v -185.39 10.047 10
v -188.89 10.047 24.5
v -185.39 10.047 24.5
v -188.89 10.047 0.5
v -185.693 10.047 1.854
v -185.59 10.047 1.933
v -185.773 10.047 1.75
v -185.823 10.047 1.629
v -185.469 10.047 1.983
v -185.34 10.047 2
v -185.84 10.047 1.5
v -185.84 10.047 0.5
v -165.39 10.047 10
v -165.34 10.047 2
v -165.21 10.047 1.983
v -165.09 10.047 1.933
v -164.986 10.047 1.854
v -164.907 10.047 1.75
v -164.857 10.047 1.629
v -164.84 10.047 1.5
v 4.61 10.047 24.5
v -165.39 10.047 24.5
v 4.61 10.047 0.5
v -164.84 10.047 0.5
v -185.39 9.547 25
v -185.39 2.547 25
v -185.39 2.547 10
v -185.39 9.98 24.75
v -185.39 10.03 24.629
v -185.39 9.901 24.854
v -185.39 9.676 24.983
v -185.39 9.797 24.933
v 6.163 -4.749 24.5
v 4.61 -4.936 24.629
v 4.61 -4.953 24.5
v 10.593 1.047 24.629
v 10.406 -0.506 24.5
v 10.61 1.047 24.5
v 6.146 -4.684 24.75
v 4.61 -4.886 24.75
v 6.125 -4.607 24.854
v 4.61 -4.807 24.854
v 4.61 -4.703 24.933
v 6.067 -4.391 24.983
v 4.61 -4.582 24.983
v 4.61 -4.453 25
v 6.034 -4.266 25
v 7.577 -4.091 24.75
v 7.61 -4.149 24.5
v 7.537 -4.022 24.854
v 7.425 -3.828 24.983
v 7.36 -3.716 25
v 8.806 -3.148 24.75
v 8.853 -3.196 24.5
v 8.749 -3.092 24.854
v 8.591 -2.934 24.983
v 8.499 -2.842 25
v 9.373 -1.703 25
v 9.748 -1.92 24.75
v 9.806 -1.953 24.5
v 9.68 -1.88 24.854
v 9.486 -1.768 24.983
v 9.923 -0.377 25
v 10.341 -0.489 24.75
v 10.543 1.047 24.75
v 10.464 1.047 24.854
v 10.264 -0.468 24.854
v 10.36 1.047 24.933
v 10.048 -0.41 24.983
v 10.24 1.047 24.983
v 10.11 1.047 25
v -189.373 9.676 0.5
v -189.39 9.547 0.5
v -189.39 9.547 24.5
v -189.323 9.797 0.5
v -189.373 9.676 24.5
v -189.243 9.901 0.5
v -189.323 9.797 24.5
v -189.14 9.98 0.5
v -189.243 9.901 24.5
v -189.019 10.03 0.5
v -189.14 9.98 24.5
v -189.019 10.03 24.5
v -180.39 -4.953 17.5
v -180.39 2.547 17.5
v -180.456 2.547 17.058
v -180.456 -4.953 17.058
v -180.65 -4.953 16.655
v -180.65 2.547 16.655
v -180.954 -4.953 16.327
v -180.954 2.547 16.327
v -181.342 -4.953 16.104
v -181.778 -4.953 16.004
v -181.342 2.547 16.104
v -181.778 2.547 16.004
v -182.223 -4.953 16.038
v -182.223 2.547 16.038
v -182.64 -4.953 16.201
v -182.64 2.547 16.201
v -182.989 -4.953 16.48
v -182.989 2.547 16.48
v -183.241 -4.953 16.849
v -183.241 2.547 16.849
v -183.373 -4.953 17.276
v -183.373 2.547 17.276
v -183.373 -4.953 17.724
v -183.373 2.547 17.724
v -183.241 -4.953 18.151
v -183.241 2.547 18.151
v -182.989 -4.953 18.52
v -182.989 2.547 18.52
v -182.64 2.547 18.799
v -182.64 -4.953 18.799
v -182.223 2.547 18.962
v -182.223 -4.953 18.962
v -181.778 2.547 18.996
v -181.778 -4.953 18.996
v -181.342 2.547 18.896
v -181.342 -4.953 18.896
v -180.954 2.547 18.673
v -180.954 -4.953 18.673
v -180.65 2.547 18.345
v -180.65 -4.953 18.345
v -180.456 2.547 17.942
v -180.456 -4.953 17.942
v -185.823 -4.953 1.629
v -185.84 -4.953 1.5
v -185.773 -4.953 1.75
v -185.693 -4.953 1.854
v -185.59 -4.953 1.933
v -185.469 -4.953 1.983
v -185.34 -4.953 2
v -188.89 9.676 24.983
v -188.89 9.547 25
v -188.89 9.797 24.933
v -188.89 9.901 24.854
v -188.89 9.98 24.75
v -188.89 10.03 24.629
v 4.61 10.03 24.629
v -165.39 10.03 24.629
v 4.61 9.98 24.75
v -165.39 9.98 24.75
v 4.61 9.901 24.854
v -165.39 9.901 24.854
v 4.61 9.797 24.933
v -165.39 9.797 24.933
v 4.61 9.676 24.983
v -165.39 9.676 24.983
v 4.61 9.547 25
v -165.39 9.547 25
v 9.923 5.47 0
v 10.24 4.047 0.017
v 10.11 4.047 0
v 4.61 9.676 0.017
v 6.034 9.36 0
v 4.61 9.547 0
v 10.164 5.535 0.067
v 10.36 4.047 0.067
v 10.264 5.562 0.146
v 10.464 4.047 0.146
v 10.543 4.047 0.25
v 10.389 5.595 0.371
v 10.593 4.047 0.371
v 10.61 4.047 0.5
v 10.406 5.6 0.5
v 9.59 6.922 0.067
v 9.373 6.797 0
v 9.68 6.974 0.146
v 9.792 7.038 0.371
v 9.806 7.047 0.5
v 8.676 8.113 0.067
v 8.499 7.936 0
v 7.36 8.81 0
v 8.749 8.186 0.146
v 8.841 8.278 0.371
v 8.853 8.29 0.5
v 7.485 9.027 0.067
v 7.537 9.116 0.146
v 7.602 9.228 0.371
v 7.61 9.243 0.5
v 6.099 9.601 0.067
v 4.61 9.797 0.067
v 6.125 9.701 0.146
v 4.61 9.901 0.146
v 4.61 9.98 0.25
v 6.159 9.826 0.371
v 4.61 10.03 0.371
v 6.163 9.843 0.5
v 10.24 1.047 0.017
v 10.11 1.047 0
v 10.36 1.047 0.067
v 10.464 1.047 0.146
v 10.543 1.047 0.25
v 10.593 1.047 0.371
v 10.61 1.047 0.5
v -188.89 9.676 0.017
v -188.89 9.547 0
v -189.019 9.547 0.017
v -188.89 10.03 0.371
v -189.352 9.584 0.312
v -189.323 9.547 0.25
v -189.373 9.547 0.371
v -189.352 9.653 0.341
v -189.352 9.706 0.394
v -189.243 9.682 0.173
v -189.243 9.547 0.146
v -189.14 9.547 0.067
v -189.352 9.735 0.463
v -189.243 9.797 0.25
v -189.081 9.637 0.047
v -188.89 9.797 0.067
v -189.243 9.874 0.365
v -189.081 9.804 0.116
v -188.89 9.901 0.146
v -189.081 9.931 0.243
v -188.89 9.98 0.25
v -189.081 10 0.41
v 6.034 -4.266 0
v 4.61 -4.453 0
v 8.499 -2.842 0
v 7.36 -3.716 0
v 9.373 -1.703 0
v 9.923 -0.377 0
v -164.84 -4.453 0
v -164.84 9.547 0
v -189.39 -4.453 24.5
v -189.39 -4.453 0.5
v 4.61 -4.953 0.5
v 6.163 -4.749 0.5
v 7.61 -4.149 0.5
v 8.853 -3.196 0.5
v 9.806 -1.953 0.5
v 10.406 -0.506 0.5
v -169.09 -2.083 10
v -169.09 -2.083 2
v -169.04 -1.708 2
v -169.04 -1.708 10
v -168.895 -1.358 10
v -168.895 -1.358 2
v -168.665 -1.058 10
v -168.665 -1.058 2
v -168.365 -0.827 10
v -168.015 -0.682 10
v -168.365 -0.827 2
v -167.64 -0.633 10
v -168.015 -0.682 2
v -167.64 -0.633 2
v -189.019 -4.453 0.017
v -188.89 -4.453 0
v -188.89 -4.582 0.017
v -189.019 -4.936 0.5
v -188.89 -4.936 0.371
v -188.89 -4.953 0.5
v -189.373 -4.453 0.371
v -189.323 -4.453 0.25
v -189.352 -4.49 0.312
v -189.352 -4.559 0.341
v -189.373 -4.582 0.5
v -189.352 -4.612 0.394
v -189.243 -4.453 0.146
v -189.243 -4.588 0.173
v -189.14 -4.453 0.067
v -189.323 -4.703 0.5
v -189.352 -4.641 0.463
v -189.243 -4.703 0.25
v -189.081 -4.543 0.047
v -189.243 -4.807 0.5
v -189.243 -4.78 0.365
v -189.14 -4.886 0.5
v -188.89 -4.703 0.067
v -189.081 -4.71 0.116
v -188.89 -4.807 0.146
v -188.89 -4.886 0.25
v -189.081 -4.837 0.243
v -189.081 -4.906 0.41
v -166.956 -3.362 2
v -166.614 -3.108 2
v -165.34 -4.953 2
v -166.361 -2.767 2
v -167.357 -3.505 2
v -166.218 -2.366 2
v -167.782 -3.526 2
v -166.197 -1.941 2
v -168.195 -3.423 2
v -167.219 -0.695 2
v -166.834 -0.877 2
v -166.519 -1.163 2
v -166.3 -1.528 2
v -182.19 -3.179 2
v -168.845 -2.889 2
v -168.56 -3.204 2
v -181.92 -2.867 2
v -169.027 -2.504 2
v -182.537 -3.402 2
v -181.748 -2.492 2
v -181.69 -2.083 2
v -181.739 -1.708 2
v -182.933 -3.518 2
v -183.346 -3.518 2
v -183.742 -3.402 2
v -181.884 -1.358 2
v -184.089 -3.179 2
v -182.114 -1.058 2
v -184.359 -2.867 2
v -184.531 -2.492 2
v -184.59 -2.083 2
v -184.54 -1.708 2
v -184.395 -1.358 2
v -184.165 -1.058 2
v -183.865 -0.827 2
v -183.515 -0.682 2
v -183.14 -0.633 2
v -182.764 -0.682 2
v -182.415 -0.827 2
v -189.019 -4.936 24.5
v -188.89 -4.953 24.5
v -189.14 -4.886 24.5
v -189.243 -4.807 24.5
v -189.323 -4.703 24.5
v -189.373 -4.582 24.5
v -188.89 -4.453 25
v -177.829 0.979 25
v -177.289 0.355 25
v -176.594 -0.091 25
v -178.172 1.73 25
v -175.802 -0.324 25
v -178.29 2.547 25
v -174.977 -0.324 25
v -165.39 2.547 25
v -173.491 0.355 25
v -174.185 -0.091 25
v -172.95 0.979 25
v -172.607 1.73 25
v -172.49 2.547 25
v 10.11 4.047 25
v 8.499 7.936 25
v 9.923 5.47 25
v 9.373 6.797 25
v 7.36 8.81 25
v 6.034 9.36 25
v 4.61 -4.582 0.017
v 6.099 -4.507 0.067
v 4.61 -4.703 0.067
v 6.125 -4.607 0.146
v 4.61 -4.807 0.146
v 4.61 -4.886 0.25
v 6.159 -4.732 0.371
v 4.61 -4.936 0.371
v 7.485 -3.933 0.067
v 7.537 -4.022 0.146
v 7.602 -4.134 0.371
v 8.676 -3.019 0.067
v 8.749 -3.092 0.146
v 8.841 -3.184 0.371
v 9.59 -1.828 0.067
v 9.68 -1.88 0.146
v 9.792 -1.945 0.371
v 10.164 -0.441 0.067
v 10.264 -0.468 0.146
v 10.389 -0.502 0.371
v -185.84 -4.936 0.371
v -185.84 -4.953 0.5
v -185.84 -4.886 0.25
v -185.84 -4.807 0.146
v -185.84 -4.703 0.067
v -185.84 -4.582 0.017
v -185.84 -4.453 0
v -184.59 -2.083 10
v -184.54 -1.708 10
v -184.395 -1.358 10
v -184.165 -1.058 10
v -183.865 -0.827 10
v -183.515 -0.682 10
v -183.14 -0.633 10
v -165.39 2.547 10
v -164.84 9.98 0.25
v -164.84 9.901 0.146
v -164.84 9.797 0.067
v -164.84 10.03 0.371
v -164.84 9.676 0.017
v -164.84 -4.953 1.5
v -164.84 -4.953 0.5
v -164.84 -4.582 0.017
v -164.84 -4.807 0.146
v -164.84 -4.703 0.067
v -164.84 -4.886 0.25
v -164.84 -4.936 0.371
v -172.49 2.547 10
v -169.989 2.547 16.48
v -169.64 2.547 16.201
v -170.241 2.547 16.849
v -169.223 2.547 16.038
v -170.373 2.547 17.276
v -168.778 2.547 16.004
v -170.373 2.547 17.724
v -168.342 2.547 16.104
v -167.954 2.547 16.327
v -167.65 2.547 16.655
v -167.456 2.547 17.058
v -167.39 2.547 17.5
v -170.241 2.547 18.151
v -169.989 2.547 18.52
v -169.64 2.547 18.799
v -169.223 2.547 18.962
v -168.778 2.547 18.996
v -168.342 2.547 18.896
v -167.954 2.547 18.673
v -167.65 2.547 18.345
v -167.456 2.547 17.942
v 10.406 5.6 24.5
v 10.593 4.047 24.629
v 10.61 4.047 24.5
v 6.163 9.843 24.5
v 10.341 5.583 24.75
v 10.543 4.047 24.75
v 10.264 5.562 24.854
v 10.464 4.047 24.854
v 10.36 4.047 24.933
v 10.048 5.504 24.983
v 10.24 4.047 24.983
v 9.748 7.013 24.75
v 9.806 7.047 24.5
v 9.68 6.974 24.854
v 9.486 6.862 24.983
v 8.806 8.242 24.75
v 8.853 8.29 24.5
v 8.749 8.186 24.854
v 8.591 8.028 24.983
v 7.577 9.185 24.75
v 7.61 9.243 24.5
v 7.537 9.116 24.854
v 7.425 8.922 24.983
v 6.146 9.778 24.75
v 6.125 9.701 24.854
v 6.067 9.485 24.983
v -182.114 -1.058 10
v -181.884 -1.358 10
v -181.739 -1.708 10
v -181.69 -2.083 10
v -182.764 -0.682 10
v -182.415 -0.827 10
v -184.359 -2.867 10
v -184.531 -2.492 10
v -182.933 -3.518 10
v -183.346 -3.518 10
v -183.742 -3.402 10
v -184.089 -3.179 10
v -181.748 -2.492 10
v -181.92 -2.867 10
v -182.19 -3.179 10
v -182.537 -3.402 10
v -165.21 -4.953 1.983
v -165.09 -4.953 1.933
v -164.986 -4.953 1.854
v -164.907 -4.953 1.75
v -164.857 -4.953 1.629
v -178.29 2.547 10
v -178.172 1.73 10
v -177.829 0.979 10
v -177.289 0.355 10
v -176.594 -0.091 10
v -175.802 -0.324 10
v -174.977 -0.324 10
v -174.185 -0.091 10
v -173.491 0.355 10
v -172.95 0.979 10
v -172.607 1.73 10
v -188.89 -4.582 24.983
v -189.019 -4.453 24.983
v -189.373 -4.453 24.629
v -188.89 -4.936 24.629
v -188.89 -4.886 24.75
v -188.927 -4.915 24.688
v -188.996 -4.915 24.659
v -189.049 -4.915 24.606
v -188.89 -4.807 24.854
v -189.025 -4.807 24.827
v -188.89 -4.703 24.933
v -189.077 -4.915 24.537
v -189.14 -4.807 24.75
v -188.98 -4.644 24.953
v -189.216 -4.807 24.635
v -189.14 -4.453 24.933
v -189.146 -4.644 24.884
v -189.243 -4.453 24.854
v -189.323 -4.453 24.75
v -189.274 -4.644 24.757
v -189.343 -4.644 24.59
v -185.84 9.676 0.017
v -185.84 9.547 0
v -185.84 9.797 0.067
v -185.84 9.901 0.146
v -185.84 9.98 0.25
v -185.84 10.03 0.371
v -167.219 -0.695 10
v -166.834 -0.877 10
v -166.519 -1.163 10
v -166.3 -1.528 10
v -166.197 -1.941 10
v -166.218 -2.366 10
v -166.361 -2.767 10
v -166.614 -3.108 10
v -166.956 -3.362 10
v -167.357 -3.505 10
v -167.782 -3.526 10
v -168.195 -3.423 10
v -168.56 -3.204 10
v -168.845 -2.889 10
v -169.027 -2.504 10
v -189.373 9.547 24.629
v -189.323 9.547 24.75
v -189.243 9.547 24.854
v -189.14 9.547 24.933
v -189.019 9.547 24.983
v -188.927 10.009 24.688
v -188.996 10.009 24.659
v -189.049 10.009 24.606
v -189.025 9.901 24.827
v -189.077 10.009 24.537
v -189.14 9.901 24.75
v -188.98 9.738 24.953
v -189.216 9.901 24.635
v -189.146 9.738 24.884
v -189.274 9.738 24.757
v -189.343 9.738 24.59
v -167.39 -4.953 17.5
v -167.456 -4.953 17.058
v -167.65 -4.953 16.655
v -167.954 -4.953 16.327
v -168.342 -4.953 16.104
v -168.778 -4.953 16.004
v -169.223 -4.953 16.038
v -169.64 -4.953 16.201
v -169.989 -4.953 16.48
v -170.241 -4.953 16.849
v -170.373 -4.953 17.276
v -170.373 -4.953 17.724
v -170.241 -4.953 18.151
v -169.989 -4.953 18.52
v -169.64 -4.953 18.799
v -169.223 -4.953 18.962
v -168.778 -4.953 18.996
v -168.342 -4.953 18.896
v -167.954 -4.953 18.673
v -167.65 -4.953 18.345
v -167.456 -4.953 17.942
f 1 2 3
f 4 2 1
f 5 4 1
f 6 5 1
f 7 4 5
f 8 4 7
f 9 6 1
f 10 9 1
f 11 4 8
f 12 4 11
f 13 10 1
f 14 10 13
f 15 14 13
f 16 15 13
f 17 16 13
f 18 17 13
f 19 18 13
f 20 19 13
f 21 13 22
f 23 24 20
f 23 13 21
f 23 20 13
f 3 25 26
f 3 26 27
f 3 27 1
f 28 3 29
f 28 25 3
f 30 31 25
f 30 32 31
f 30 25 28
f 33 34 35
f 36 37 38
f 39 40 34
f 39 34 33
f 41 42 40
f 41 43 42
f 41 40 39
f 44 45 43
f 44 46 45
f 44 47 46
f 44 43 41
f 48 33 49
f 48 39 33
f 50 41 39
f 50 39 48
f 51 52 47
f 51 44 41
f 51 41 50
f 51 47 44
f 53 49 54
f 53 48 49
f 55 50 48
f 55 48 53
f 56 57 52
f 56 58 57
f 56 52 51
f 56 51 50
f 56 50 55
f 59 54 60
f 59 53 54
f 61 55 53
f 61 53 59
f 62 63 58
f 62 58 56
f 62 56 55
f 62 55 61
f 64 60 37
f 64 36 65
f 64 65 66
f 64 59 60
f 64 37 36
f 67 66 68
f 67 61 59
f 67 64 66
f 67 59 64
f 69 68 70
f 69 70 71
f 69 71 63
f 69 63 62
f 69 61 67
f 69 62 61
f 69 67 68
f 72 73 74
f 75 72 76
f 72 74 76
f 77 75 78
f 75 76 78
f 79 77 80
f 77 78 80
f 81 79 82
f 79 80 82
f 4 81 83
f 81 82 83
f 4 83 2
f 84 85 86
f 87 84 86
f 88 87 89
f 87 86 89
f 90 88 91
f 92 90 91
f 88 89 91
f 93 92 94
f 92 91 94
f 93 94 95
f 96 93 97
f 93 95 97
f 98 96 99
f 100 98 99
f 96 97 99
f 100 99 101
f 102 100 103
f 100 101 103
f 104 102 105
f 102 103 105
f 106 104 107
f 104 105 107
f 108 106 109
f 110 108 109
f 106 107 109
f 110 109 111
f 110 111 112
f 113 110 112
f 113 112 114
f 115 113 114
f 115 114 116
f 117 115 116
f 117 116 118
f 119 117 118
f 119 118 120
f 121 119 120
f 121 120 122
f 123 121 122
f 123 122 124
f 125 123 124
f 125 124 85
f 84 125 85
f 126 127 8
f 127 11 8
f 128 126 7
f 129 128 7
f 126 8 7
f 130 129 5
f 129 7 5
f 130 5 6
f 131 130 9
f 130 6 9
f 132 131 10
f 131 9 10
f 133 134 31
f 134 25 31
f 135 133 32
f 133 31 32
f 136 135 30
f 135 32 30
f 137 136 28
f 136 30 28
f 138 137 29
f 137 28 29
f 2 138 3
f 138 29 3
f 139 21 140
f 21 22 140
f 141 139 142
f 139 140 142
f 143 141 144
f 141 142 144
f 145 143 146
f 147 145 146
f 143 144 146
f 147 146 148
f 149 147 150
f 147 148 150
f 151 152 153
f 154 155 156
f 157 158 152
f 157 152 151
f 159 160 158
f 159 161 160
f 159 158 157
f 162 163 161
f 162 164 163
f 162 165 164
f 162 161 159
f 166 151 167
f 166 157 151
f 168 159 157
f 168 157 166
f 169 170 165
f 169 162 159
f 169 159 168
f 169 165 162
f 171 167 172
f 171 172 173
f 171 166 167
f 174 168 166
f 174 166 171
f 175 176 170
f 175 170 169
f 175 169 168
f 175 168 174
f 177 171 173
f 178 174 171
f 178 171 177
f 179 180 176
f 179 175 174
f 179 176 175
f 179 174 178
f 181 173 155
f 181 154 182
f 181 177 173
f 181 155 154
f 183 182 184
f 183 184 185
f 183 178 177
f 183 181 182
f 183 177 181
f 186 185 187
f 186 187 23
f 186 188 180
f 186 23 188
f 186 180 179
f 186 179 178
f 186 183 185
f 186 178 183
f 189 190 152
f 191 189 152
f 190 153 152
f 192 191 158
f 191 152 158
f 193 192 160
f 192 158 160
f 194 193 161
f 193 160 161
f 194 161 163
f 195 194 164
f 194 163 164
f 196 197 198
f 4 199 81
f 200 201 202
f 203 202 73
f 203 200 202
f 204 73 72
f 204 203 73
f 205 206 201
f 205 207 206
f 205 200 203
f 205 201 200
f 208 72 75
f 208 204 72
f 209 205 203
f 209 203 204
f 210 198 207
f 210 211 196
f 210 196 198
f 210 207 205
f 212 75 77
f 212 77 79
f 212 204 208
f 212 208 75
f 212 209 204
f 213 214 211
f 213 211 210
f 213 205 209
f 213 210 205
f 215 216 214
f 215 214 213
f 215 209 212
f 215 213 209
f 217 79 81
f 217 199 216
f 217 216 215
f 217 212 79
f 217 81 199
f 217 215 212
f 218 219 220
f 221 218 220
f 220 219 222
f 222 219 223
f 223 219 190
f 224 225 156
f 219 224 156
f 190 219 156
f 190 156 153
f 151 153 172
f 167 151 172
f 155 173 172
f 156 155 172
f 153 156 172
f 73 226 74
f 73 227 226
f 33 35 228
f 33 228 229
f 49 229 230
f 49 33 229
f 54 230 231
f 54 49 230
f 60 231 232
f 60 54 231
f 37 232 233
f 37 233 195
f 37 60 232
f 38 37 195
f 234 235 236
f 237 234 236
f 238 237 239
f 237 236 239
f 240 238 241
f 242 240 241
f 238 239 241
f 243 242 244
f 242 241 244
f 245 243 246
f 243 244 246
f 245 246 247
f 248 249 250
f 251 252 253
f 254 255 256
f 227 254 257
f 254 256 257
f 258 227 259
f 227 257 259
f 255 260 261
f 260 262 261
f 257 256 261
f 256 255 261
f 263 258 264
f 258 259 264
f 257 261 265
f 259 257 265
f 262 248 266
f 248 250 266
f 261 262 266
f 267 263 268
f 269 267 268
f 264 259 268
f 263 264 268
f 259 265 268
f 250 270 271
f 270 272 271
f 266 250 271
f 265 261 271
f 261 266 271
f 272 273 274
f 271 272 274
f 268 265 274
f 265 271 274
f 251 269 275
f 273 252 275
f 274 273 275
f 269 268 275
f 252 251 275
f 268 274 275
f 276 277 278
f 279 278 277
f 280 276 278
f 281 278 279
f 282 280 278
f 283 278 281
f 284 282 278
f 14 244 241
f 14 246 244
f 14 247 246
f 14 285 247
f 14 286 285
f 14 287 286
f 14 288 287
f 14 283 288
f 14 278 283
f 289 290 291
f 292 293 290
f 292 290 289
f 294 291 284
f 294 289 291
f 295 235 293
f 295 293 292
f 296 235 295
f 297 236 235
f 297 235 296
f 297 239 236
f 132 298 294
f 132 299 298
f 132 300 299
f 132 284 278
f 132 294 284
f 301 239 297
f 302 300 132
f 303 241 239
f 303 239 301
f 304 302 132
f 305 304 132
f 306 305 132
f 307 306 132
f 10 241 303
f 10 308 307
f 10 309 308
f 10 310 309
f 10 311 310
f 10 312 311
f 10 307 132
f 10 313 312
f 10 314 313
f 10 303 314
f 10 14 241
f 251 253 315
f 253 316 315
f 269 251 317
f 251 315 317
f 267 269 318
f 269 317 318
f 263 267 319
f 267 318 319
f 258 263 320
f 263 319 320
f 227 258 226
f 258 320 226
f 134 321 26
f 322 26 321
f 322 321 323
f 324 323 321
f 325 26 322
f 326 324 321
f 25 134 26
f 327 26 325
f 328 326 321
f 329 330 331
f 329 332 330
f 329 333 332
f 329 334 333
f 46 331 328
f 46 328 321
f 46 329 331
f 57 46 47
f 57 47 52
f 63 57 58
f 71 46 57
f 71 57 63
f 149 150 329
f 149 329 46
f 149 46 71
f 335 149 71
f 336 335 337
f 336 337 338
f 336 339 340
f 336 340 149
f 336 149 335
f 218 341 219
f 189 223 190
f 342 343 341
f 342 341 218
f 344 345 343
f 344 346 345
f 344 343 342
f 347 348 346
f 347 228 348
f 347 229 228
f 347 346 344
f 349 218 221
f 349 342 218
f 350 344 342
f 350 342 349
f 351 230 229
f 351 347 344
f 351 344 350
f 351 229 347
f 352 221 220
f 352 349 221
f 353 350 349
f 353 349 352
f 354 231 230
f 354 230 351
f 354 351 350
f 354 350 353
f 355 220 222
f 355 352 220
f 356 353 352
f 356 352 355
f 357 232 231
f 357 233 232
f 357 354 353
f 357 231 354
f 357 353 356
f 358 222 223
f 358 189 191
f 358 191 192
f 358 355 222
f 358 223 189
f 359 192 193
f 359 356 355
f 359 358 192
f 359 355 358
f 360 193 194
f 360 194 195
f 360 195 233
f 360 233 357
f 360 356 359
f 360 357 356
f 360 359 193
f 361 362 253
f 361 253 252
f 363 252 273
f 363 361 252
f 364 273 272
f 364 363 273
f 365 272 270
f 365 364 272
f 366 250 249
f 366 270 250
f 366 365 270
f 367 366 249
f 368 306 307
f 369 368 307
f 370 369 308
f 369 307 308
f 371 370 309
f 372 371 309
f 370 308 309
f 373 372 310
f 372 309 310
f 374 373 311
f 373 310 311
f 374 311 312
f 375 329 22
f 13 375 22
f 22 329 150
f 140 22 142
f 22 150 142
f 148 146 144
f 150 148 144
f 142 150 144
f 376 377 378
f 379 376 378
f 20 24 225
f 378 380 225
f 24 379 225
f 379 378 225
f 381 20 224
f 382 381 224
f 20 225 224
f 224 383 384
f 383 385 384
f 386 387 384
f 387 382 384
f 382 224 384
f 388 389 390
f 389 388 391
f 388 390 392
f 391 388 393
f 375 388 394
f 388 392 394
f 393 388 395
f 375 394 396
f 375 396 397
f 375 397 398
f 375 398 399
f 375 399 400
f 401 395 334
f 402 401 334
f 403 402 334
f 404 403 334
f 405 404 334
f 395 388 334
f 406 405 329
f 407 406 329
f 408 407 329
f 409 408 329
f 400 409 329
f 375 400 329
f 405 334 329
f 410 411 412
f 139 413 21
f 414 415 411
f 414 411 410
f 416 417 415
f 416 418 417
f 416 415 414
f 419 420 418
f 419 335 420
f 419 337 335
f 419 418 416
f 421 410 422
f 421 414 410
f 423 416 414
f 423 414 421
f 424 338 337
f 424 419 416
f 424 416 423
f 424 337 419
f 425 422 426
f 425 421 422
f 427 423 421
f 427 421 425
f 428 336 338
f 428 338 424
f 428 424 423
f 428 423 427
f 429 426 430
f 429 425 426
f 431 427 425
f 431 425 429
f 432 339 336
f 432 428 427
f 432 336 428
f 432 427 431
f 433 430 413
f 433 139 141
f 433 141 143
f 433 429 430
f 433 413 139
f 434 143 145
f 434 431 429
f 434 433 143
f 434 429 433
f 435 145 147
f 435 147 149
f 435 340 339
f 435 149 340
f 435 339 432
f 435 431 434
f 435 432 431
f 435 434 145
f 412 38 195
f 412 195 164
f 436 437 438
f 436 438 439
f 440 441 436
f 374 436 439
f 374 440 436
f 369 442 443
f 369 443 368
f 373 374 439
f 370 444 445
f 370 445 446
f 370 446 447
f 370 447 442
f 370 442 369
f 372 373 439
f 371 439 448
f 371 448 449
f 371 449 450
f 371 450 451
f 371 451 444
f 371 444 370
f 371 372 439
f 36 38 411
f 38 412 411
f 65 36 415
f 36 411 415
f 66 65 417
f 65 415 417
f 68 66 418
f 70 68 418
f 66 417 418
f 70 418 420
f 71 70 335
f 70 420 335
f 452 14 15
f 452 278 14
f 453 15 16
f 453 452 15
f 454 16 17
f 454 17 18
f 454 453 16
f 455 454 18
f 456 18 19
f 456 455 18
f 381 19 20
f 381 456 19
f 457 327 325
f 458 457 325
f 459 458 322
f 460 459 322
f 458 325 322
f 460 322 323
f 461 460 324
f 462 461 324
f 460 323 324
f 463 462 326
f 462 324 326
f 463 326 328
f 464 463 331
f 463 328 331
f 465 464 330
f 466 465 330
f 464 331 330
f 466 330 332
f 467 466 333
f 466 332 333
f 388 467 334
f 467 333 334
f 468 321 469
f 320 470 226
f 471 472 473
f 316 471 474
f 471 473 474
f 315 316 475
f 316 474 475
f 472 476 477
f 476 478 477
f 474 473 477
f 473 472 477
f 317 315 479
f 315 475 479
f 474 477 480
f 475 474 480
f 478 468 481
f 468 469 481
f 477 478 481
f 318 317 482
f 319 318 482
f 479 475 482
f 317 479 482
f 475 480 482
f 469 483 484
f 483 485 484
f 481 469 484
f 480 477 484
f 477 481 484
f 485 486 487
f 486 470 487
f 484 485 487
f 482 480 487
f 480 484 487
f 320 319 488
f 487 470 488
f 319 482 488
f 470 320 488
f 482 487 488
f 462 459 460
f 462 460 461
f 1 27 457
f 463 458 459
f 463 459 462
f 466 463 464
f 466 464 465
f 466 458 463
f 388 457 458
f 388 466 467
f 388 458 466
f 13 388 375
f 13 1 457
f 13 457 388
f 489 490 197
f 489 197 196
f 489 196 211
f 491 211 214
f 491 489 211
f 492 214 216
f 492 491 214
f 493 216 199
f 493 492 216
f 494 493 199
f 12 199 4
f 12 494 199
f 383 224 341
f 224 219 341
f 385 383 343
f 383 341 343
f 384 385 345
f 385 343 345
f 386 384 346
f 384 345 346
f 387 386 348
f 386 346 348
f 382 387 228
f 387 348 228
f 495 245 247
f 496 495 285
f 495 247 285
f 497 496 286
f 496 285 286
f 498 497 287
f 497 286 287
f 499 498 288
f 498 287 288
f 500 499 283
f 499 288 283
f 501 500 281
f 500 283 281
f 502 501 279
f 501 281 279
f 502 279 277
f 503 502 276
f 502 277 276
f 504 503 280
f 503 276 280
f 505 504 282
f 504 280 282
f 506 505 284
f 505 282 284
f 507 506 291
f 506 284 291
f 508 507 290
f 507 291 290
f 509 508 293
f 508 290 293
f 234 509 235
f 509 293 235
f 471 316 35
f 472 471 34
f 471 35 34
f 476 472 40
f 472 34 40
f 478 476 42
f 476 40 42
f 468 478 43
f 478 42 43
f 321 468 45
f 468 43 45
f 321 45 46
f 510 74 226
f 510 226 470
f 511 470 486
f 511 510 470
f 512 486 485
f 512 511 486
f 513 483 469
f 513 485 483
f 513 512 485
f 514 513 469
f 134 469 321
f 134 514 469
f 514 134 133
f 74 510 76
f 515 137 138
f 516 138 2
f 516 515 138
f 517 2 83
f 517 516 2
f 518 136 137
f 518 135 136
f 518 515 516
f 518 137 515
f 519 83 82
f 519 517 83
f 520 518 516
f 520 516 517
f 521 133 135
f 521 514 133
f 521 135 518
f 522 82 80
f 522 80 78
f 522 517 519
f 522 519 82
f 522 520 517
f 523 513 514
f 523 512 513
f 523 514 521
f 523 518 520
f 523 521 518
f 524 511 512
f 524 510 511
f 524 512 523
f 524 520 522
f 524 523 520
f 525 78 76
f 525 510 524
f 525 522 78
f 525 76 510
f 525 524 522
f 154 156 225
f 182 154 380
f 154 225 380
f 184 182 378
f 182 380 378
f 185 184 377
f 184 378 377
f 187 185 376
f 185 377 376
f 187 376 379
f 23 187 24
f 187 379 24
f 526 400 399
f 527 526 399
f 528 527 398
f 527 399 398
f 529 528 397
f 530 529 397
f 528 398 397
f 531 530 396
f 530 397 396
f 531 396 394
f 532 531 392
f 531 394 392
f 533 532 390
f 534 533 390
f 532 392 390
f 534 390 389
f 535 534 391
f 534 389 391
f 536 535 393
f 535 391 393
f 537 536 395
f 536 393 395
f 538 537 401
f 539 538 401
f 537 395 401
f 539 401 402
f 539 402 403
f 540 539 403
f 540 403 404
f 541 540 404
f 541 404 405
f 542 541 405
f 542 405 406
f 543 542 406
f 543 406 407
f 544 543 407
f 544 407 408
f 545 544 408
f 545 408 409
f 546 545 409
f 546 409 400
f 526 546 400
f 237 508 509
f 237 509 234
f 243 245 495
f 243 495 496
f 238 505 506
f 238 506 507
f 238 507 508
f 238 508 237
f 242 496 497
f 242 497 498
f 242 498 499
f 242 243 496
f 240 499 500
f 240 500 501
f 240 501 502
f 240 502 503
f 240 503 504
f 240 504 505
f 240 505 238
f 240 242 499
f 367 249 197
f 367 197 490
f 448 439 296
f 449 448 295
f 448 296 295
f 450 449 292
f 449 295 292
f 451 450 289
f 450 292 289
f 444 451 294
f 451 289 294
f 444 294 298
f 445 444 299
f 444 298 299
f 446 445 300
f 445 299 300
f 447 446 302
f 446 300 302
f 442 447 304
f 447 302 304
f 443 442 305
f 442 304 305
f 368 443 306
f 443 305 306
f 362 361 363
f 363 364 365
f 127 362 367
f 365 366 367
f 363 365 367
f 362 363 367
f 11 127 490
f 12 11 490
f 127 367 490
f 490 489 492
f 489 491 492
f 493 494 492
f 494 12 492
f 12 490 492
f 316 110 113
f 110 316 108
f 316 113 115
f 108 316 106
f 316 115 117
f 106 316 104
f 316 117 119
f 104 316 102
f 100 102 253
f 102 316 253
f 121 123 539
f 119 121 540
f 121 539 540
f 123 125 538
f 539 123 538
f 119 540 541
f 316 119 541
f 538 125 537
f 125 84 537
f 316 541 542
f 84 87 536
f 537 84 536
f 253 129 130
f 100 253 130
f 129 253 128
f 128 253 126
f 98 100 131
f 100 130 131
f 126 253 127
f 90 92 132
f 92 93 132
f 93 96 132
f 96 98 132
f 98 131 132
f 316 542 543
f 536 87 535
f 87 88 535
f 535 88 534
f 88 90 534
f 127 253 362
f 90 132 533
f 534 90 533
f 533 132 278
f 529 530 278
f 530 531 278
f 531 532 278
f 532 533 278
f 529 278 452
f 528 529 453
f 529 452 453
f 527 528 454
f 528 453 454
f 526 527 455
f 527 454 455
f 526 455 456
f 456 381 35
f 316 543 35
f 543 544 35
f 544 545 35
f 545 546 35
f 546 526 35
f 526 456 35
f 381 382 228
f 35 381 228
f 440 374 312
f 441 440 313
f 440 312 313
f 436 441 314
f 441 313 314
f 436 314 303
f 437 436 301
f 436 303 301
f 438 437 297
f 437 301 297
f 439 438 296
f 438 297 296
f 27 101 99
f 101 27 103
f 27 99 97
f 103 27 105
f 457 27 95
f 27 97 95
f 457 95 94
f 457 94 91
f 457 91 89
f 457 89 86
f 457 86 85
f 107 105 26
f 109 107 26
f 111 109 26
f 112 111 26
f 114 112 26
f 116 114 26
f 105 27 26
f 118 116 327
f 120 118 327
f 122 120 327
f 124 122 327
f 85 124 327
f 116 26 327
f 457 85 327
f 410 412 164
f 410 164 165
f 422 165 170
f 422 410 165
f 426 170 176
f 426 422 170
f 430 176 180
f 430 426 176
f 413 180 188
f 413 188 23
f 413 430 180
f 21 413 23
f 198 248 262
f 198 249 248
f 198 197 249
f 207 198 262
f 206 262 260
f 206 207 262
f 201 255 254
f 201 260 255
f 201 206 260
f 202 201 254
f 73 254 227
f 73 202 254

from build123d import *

# Parameters (mm, degrees)
IZIM1_W                     = 200
IZIM1_H                     = 15
Y_KSEKLIK_EKSTR_ZYON1_DEPTH = 25
RADYUS1_R                   = 6
IZIM3_R                     = 2.9
KES_EKSTR_ZYON2_DEPTH       = 1
KES_EKSTR_ZYON2_DEPTH_BACK  = 15
KES_EKSTR_ZYON3_DEPTH       = 10
IZIM6_R                     = 1.45
KES_EKSTR_ZYON4_DEPTH       = 2
IZIM8_W                     = 20
IZIM8_H                     = 7.5
KES_EKSTR_ZYON6_DEPTH       = 15
IZIM9_R                     = 1.5
KES_EKSTR_ZYON7_DEPTH       = 15
RADYUS2_R                   = 0.5


with BuildPart() as part:
    # Çizim1 → Yükseklik-Ekstrüzyon1 (new body)
    with BuildSketch(Plane.XY):
        with Locations((-89.389671362, 2.546948357)):
            Rectangle(IZIM1_W, IZIM1_H)
    extrude(amount=Y_KSEKLIK_EKSTR_ZYON1_DEPTH)

    # Radyus1
    radyus1_edges = [part.edges().sort_by_distance(p)[0] for p in [
        (10.610328638, -4.953051643, 12.5),
        (10.610328638, 10.046948357, 12.5),
    ]]
    fillet(radyus1_edges, radius=RADYUS1_R)

    # Çizim3 → Kes-Ekstrüzyon2 (cut, two sides)
    with BuildSketch(Plane.XY.offset(25)) as kes_ekstr_zyon2_sk:
        with Locations((-175.389671362, 2.546948357)):
            Circle(IZIM3_R)
    extrude(amount=KES_EKSTR_ZYON2_DEPTH, mode=Mode.SUBTRACT)
    extrude(kes_ekstr_zyon2_sk.sketch, amount=-KES_EKSTR_ZYON2_DEPTH_BACK, mode=Mode.SUBTRACT)

    # Çizim4 → Kes-Ekstrüzyon3 (cut)
    with BuildSketch(Plane(origin=(0, 0, 0), x_dir=(-1, 0, 0), z_dir=(0, 0, -1))):
        with BuildLine():
            ThreePointArc((167.639671362, -0.633051643), (166.614366529, -3.108356476), (169.089671362, -2.083051643))
            Line((169.089671362, -2.083051643), (167.639671362, -2.083051643))
            Line((167.639671362, -2.083051643), (167.639671362, -0.633051643))
        make_face()
        with BuildLine():
            Line((167.639671362, -2.083051643), (169.089671362, -2.083051643))
            ThreePointArc((169.089671362, -2.083051643), (168.664976194, -1.05774681), (167.639671362, -0.633051643))
            Line((167.639671362, -0.633051643), (167.639671362, -2.083051643))
        make_face()
        with BuildLine():
            ThreePointArc((184.589671362, -2.083051643), (184.164976194, -1.05774681), (183.139671362, -0.633051643))
            Line((183.139671362, -0.633051643), (183.139671362, -2.083051643))
            Line((183.139671362, -2.083051643), (181.689671362, -2.083051643))
            ThreePointArc((181.689671362, -2.083051643), (183.139671362, -3.533051643), (184.589671362, -2.083051643))
        make_face()
        with BuildLine():
            Line((183.139671362, -2.083051643), (183.139671362, -0.633051643))
            ThreePointArc((183.139671362, -0.633051643), (182.114366529, -1.05774681), (181.689671362, -2.083051643))
            Line((181.689671362, -2.083051643), (183.139671362, -2.083051643))
        make_face()
    extrude(amount=-KES_EKSTR_ZYON3_DEPTH, mode=Mode.SUBTRACT)

    # Çizim6 → Kes-Ekstrüzyon4 (cut)
    with BuildSketch(Plane(origin=(0, 0, 0), x_dir=(-1, 0, 0), z_dir=(0, 0, -1))):
        Polygon((185.839671362, -4.953051643), (185.839671362, -2.083051643), (185.839671362, 10.046948357), (165.238795476, 10.046948357), (164.839671362, 10.046948357), (164.839671362, -4.953051643), align=None)
        with Locations((167.639671362, -2.083051643)):
            Circle(IZIM6_R, mode=Mode.SUBTRACT)
        with Locations((183.139671362, -2.083051643)):
            Circle(IZIM6_R, mode=Mode.SUBTRACT)
    extrude(amount=-KES_EKSTR_ZYON4_DEPTH, mode=Mode.SUBTRACT)

    # Çizim8 → Kes-Ekstrüzyon6 (cut)
    with BuildSketch(Plane.XY.offset(25)):
        with Locations((-175.389671362, 6.296948357)):
            Rectangle(IZIM8_W, IZIM8_H)
    extrude(amount=-KES_EKSTR_ZYON6_DEPTH, mode=Mode.SUBTRACT)

    # Çizim9 → Kes-Ekstrüzyon7 (cut)
    with BuildSketch(Plane(origin=(0, 2.546948357, 0), x_dir=(1, 0, 0), z_dir=(0, 1, 0))):
        with Locations((-168.889671362, -17.5)):
            Circle(IZIM9_R)
        with Locations((-181.889671362, -17.5)):
            Circle(IZIM9_R)
    extrude(amount=-KES_EKSTR_ZYON7_DEPTH, mode=Mode.SUBTRACT)

    # Radyus2
    radyus2_edges = [part.edges().sort_by_distance(p)[0] for p in [
        (-189.389671362, 2.546948357, 25),
        (-92.389671362, -4.953051643, 25),
        (10.610328638, 2.546948357, 0),
        (10.610328638, 2.546948357, 25),
        (-80.114671362, 10.046948357, 0),
        (8.852969326, 8.289589044, 0),
        (8.852969326, -3.19569233, 0),
        (-80.389671362, 10.046948357, 25),
        (8.852969326, 8.289589044, 25),
        (8.852969326, -3.19569233, 25),
        (-80.114671362, -4.953051643, 0),
        (-187.614671362, 10.046948357, 0),
        (-187.614671362, -4.953051643, 0),
        (-185.839671362, 2.546948357, 2),
        (-189.389671362, 2.546948357, 0),
        (-164.839671362, 2.546948357, 2),
        (-187.389671362, 10.046948357, 25),
        (-189.389671362, -4.953051643, 12.5),
        (-189.389671362, 10.046948357, 12.5),
    ]]
    fillet(radyus2_edges, radius=RADYUS2_R)


solid = part.part
